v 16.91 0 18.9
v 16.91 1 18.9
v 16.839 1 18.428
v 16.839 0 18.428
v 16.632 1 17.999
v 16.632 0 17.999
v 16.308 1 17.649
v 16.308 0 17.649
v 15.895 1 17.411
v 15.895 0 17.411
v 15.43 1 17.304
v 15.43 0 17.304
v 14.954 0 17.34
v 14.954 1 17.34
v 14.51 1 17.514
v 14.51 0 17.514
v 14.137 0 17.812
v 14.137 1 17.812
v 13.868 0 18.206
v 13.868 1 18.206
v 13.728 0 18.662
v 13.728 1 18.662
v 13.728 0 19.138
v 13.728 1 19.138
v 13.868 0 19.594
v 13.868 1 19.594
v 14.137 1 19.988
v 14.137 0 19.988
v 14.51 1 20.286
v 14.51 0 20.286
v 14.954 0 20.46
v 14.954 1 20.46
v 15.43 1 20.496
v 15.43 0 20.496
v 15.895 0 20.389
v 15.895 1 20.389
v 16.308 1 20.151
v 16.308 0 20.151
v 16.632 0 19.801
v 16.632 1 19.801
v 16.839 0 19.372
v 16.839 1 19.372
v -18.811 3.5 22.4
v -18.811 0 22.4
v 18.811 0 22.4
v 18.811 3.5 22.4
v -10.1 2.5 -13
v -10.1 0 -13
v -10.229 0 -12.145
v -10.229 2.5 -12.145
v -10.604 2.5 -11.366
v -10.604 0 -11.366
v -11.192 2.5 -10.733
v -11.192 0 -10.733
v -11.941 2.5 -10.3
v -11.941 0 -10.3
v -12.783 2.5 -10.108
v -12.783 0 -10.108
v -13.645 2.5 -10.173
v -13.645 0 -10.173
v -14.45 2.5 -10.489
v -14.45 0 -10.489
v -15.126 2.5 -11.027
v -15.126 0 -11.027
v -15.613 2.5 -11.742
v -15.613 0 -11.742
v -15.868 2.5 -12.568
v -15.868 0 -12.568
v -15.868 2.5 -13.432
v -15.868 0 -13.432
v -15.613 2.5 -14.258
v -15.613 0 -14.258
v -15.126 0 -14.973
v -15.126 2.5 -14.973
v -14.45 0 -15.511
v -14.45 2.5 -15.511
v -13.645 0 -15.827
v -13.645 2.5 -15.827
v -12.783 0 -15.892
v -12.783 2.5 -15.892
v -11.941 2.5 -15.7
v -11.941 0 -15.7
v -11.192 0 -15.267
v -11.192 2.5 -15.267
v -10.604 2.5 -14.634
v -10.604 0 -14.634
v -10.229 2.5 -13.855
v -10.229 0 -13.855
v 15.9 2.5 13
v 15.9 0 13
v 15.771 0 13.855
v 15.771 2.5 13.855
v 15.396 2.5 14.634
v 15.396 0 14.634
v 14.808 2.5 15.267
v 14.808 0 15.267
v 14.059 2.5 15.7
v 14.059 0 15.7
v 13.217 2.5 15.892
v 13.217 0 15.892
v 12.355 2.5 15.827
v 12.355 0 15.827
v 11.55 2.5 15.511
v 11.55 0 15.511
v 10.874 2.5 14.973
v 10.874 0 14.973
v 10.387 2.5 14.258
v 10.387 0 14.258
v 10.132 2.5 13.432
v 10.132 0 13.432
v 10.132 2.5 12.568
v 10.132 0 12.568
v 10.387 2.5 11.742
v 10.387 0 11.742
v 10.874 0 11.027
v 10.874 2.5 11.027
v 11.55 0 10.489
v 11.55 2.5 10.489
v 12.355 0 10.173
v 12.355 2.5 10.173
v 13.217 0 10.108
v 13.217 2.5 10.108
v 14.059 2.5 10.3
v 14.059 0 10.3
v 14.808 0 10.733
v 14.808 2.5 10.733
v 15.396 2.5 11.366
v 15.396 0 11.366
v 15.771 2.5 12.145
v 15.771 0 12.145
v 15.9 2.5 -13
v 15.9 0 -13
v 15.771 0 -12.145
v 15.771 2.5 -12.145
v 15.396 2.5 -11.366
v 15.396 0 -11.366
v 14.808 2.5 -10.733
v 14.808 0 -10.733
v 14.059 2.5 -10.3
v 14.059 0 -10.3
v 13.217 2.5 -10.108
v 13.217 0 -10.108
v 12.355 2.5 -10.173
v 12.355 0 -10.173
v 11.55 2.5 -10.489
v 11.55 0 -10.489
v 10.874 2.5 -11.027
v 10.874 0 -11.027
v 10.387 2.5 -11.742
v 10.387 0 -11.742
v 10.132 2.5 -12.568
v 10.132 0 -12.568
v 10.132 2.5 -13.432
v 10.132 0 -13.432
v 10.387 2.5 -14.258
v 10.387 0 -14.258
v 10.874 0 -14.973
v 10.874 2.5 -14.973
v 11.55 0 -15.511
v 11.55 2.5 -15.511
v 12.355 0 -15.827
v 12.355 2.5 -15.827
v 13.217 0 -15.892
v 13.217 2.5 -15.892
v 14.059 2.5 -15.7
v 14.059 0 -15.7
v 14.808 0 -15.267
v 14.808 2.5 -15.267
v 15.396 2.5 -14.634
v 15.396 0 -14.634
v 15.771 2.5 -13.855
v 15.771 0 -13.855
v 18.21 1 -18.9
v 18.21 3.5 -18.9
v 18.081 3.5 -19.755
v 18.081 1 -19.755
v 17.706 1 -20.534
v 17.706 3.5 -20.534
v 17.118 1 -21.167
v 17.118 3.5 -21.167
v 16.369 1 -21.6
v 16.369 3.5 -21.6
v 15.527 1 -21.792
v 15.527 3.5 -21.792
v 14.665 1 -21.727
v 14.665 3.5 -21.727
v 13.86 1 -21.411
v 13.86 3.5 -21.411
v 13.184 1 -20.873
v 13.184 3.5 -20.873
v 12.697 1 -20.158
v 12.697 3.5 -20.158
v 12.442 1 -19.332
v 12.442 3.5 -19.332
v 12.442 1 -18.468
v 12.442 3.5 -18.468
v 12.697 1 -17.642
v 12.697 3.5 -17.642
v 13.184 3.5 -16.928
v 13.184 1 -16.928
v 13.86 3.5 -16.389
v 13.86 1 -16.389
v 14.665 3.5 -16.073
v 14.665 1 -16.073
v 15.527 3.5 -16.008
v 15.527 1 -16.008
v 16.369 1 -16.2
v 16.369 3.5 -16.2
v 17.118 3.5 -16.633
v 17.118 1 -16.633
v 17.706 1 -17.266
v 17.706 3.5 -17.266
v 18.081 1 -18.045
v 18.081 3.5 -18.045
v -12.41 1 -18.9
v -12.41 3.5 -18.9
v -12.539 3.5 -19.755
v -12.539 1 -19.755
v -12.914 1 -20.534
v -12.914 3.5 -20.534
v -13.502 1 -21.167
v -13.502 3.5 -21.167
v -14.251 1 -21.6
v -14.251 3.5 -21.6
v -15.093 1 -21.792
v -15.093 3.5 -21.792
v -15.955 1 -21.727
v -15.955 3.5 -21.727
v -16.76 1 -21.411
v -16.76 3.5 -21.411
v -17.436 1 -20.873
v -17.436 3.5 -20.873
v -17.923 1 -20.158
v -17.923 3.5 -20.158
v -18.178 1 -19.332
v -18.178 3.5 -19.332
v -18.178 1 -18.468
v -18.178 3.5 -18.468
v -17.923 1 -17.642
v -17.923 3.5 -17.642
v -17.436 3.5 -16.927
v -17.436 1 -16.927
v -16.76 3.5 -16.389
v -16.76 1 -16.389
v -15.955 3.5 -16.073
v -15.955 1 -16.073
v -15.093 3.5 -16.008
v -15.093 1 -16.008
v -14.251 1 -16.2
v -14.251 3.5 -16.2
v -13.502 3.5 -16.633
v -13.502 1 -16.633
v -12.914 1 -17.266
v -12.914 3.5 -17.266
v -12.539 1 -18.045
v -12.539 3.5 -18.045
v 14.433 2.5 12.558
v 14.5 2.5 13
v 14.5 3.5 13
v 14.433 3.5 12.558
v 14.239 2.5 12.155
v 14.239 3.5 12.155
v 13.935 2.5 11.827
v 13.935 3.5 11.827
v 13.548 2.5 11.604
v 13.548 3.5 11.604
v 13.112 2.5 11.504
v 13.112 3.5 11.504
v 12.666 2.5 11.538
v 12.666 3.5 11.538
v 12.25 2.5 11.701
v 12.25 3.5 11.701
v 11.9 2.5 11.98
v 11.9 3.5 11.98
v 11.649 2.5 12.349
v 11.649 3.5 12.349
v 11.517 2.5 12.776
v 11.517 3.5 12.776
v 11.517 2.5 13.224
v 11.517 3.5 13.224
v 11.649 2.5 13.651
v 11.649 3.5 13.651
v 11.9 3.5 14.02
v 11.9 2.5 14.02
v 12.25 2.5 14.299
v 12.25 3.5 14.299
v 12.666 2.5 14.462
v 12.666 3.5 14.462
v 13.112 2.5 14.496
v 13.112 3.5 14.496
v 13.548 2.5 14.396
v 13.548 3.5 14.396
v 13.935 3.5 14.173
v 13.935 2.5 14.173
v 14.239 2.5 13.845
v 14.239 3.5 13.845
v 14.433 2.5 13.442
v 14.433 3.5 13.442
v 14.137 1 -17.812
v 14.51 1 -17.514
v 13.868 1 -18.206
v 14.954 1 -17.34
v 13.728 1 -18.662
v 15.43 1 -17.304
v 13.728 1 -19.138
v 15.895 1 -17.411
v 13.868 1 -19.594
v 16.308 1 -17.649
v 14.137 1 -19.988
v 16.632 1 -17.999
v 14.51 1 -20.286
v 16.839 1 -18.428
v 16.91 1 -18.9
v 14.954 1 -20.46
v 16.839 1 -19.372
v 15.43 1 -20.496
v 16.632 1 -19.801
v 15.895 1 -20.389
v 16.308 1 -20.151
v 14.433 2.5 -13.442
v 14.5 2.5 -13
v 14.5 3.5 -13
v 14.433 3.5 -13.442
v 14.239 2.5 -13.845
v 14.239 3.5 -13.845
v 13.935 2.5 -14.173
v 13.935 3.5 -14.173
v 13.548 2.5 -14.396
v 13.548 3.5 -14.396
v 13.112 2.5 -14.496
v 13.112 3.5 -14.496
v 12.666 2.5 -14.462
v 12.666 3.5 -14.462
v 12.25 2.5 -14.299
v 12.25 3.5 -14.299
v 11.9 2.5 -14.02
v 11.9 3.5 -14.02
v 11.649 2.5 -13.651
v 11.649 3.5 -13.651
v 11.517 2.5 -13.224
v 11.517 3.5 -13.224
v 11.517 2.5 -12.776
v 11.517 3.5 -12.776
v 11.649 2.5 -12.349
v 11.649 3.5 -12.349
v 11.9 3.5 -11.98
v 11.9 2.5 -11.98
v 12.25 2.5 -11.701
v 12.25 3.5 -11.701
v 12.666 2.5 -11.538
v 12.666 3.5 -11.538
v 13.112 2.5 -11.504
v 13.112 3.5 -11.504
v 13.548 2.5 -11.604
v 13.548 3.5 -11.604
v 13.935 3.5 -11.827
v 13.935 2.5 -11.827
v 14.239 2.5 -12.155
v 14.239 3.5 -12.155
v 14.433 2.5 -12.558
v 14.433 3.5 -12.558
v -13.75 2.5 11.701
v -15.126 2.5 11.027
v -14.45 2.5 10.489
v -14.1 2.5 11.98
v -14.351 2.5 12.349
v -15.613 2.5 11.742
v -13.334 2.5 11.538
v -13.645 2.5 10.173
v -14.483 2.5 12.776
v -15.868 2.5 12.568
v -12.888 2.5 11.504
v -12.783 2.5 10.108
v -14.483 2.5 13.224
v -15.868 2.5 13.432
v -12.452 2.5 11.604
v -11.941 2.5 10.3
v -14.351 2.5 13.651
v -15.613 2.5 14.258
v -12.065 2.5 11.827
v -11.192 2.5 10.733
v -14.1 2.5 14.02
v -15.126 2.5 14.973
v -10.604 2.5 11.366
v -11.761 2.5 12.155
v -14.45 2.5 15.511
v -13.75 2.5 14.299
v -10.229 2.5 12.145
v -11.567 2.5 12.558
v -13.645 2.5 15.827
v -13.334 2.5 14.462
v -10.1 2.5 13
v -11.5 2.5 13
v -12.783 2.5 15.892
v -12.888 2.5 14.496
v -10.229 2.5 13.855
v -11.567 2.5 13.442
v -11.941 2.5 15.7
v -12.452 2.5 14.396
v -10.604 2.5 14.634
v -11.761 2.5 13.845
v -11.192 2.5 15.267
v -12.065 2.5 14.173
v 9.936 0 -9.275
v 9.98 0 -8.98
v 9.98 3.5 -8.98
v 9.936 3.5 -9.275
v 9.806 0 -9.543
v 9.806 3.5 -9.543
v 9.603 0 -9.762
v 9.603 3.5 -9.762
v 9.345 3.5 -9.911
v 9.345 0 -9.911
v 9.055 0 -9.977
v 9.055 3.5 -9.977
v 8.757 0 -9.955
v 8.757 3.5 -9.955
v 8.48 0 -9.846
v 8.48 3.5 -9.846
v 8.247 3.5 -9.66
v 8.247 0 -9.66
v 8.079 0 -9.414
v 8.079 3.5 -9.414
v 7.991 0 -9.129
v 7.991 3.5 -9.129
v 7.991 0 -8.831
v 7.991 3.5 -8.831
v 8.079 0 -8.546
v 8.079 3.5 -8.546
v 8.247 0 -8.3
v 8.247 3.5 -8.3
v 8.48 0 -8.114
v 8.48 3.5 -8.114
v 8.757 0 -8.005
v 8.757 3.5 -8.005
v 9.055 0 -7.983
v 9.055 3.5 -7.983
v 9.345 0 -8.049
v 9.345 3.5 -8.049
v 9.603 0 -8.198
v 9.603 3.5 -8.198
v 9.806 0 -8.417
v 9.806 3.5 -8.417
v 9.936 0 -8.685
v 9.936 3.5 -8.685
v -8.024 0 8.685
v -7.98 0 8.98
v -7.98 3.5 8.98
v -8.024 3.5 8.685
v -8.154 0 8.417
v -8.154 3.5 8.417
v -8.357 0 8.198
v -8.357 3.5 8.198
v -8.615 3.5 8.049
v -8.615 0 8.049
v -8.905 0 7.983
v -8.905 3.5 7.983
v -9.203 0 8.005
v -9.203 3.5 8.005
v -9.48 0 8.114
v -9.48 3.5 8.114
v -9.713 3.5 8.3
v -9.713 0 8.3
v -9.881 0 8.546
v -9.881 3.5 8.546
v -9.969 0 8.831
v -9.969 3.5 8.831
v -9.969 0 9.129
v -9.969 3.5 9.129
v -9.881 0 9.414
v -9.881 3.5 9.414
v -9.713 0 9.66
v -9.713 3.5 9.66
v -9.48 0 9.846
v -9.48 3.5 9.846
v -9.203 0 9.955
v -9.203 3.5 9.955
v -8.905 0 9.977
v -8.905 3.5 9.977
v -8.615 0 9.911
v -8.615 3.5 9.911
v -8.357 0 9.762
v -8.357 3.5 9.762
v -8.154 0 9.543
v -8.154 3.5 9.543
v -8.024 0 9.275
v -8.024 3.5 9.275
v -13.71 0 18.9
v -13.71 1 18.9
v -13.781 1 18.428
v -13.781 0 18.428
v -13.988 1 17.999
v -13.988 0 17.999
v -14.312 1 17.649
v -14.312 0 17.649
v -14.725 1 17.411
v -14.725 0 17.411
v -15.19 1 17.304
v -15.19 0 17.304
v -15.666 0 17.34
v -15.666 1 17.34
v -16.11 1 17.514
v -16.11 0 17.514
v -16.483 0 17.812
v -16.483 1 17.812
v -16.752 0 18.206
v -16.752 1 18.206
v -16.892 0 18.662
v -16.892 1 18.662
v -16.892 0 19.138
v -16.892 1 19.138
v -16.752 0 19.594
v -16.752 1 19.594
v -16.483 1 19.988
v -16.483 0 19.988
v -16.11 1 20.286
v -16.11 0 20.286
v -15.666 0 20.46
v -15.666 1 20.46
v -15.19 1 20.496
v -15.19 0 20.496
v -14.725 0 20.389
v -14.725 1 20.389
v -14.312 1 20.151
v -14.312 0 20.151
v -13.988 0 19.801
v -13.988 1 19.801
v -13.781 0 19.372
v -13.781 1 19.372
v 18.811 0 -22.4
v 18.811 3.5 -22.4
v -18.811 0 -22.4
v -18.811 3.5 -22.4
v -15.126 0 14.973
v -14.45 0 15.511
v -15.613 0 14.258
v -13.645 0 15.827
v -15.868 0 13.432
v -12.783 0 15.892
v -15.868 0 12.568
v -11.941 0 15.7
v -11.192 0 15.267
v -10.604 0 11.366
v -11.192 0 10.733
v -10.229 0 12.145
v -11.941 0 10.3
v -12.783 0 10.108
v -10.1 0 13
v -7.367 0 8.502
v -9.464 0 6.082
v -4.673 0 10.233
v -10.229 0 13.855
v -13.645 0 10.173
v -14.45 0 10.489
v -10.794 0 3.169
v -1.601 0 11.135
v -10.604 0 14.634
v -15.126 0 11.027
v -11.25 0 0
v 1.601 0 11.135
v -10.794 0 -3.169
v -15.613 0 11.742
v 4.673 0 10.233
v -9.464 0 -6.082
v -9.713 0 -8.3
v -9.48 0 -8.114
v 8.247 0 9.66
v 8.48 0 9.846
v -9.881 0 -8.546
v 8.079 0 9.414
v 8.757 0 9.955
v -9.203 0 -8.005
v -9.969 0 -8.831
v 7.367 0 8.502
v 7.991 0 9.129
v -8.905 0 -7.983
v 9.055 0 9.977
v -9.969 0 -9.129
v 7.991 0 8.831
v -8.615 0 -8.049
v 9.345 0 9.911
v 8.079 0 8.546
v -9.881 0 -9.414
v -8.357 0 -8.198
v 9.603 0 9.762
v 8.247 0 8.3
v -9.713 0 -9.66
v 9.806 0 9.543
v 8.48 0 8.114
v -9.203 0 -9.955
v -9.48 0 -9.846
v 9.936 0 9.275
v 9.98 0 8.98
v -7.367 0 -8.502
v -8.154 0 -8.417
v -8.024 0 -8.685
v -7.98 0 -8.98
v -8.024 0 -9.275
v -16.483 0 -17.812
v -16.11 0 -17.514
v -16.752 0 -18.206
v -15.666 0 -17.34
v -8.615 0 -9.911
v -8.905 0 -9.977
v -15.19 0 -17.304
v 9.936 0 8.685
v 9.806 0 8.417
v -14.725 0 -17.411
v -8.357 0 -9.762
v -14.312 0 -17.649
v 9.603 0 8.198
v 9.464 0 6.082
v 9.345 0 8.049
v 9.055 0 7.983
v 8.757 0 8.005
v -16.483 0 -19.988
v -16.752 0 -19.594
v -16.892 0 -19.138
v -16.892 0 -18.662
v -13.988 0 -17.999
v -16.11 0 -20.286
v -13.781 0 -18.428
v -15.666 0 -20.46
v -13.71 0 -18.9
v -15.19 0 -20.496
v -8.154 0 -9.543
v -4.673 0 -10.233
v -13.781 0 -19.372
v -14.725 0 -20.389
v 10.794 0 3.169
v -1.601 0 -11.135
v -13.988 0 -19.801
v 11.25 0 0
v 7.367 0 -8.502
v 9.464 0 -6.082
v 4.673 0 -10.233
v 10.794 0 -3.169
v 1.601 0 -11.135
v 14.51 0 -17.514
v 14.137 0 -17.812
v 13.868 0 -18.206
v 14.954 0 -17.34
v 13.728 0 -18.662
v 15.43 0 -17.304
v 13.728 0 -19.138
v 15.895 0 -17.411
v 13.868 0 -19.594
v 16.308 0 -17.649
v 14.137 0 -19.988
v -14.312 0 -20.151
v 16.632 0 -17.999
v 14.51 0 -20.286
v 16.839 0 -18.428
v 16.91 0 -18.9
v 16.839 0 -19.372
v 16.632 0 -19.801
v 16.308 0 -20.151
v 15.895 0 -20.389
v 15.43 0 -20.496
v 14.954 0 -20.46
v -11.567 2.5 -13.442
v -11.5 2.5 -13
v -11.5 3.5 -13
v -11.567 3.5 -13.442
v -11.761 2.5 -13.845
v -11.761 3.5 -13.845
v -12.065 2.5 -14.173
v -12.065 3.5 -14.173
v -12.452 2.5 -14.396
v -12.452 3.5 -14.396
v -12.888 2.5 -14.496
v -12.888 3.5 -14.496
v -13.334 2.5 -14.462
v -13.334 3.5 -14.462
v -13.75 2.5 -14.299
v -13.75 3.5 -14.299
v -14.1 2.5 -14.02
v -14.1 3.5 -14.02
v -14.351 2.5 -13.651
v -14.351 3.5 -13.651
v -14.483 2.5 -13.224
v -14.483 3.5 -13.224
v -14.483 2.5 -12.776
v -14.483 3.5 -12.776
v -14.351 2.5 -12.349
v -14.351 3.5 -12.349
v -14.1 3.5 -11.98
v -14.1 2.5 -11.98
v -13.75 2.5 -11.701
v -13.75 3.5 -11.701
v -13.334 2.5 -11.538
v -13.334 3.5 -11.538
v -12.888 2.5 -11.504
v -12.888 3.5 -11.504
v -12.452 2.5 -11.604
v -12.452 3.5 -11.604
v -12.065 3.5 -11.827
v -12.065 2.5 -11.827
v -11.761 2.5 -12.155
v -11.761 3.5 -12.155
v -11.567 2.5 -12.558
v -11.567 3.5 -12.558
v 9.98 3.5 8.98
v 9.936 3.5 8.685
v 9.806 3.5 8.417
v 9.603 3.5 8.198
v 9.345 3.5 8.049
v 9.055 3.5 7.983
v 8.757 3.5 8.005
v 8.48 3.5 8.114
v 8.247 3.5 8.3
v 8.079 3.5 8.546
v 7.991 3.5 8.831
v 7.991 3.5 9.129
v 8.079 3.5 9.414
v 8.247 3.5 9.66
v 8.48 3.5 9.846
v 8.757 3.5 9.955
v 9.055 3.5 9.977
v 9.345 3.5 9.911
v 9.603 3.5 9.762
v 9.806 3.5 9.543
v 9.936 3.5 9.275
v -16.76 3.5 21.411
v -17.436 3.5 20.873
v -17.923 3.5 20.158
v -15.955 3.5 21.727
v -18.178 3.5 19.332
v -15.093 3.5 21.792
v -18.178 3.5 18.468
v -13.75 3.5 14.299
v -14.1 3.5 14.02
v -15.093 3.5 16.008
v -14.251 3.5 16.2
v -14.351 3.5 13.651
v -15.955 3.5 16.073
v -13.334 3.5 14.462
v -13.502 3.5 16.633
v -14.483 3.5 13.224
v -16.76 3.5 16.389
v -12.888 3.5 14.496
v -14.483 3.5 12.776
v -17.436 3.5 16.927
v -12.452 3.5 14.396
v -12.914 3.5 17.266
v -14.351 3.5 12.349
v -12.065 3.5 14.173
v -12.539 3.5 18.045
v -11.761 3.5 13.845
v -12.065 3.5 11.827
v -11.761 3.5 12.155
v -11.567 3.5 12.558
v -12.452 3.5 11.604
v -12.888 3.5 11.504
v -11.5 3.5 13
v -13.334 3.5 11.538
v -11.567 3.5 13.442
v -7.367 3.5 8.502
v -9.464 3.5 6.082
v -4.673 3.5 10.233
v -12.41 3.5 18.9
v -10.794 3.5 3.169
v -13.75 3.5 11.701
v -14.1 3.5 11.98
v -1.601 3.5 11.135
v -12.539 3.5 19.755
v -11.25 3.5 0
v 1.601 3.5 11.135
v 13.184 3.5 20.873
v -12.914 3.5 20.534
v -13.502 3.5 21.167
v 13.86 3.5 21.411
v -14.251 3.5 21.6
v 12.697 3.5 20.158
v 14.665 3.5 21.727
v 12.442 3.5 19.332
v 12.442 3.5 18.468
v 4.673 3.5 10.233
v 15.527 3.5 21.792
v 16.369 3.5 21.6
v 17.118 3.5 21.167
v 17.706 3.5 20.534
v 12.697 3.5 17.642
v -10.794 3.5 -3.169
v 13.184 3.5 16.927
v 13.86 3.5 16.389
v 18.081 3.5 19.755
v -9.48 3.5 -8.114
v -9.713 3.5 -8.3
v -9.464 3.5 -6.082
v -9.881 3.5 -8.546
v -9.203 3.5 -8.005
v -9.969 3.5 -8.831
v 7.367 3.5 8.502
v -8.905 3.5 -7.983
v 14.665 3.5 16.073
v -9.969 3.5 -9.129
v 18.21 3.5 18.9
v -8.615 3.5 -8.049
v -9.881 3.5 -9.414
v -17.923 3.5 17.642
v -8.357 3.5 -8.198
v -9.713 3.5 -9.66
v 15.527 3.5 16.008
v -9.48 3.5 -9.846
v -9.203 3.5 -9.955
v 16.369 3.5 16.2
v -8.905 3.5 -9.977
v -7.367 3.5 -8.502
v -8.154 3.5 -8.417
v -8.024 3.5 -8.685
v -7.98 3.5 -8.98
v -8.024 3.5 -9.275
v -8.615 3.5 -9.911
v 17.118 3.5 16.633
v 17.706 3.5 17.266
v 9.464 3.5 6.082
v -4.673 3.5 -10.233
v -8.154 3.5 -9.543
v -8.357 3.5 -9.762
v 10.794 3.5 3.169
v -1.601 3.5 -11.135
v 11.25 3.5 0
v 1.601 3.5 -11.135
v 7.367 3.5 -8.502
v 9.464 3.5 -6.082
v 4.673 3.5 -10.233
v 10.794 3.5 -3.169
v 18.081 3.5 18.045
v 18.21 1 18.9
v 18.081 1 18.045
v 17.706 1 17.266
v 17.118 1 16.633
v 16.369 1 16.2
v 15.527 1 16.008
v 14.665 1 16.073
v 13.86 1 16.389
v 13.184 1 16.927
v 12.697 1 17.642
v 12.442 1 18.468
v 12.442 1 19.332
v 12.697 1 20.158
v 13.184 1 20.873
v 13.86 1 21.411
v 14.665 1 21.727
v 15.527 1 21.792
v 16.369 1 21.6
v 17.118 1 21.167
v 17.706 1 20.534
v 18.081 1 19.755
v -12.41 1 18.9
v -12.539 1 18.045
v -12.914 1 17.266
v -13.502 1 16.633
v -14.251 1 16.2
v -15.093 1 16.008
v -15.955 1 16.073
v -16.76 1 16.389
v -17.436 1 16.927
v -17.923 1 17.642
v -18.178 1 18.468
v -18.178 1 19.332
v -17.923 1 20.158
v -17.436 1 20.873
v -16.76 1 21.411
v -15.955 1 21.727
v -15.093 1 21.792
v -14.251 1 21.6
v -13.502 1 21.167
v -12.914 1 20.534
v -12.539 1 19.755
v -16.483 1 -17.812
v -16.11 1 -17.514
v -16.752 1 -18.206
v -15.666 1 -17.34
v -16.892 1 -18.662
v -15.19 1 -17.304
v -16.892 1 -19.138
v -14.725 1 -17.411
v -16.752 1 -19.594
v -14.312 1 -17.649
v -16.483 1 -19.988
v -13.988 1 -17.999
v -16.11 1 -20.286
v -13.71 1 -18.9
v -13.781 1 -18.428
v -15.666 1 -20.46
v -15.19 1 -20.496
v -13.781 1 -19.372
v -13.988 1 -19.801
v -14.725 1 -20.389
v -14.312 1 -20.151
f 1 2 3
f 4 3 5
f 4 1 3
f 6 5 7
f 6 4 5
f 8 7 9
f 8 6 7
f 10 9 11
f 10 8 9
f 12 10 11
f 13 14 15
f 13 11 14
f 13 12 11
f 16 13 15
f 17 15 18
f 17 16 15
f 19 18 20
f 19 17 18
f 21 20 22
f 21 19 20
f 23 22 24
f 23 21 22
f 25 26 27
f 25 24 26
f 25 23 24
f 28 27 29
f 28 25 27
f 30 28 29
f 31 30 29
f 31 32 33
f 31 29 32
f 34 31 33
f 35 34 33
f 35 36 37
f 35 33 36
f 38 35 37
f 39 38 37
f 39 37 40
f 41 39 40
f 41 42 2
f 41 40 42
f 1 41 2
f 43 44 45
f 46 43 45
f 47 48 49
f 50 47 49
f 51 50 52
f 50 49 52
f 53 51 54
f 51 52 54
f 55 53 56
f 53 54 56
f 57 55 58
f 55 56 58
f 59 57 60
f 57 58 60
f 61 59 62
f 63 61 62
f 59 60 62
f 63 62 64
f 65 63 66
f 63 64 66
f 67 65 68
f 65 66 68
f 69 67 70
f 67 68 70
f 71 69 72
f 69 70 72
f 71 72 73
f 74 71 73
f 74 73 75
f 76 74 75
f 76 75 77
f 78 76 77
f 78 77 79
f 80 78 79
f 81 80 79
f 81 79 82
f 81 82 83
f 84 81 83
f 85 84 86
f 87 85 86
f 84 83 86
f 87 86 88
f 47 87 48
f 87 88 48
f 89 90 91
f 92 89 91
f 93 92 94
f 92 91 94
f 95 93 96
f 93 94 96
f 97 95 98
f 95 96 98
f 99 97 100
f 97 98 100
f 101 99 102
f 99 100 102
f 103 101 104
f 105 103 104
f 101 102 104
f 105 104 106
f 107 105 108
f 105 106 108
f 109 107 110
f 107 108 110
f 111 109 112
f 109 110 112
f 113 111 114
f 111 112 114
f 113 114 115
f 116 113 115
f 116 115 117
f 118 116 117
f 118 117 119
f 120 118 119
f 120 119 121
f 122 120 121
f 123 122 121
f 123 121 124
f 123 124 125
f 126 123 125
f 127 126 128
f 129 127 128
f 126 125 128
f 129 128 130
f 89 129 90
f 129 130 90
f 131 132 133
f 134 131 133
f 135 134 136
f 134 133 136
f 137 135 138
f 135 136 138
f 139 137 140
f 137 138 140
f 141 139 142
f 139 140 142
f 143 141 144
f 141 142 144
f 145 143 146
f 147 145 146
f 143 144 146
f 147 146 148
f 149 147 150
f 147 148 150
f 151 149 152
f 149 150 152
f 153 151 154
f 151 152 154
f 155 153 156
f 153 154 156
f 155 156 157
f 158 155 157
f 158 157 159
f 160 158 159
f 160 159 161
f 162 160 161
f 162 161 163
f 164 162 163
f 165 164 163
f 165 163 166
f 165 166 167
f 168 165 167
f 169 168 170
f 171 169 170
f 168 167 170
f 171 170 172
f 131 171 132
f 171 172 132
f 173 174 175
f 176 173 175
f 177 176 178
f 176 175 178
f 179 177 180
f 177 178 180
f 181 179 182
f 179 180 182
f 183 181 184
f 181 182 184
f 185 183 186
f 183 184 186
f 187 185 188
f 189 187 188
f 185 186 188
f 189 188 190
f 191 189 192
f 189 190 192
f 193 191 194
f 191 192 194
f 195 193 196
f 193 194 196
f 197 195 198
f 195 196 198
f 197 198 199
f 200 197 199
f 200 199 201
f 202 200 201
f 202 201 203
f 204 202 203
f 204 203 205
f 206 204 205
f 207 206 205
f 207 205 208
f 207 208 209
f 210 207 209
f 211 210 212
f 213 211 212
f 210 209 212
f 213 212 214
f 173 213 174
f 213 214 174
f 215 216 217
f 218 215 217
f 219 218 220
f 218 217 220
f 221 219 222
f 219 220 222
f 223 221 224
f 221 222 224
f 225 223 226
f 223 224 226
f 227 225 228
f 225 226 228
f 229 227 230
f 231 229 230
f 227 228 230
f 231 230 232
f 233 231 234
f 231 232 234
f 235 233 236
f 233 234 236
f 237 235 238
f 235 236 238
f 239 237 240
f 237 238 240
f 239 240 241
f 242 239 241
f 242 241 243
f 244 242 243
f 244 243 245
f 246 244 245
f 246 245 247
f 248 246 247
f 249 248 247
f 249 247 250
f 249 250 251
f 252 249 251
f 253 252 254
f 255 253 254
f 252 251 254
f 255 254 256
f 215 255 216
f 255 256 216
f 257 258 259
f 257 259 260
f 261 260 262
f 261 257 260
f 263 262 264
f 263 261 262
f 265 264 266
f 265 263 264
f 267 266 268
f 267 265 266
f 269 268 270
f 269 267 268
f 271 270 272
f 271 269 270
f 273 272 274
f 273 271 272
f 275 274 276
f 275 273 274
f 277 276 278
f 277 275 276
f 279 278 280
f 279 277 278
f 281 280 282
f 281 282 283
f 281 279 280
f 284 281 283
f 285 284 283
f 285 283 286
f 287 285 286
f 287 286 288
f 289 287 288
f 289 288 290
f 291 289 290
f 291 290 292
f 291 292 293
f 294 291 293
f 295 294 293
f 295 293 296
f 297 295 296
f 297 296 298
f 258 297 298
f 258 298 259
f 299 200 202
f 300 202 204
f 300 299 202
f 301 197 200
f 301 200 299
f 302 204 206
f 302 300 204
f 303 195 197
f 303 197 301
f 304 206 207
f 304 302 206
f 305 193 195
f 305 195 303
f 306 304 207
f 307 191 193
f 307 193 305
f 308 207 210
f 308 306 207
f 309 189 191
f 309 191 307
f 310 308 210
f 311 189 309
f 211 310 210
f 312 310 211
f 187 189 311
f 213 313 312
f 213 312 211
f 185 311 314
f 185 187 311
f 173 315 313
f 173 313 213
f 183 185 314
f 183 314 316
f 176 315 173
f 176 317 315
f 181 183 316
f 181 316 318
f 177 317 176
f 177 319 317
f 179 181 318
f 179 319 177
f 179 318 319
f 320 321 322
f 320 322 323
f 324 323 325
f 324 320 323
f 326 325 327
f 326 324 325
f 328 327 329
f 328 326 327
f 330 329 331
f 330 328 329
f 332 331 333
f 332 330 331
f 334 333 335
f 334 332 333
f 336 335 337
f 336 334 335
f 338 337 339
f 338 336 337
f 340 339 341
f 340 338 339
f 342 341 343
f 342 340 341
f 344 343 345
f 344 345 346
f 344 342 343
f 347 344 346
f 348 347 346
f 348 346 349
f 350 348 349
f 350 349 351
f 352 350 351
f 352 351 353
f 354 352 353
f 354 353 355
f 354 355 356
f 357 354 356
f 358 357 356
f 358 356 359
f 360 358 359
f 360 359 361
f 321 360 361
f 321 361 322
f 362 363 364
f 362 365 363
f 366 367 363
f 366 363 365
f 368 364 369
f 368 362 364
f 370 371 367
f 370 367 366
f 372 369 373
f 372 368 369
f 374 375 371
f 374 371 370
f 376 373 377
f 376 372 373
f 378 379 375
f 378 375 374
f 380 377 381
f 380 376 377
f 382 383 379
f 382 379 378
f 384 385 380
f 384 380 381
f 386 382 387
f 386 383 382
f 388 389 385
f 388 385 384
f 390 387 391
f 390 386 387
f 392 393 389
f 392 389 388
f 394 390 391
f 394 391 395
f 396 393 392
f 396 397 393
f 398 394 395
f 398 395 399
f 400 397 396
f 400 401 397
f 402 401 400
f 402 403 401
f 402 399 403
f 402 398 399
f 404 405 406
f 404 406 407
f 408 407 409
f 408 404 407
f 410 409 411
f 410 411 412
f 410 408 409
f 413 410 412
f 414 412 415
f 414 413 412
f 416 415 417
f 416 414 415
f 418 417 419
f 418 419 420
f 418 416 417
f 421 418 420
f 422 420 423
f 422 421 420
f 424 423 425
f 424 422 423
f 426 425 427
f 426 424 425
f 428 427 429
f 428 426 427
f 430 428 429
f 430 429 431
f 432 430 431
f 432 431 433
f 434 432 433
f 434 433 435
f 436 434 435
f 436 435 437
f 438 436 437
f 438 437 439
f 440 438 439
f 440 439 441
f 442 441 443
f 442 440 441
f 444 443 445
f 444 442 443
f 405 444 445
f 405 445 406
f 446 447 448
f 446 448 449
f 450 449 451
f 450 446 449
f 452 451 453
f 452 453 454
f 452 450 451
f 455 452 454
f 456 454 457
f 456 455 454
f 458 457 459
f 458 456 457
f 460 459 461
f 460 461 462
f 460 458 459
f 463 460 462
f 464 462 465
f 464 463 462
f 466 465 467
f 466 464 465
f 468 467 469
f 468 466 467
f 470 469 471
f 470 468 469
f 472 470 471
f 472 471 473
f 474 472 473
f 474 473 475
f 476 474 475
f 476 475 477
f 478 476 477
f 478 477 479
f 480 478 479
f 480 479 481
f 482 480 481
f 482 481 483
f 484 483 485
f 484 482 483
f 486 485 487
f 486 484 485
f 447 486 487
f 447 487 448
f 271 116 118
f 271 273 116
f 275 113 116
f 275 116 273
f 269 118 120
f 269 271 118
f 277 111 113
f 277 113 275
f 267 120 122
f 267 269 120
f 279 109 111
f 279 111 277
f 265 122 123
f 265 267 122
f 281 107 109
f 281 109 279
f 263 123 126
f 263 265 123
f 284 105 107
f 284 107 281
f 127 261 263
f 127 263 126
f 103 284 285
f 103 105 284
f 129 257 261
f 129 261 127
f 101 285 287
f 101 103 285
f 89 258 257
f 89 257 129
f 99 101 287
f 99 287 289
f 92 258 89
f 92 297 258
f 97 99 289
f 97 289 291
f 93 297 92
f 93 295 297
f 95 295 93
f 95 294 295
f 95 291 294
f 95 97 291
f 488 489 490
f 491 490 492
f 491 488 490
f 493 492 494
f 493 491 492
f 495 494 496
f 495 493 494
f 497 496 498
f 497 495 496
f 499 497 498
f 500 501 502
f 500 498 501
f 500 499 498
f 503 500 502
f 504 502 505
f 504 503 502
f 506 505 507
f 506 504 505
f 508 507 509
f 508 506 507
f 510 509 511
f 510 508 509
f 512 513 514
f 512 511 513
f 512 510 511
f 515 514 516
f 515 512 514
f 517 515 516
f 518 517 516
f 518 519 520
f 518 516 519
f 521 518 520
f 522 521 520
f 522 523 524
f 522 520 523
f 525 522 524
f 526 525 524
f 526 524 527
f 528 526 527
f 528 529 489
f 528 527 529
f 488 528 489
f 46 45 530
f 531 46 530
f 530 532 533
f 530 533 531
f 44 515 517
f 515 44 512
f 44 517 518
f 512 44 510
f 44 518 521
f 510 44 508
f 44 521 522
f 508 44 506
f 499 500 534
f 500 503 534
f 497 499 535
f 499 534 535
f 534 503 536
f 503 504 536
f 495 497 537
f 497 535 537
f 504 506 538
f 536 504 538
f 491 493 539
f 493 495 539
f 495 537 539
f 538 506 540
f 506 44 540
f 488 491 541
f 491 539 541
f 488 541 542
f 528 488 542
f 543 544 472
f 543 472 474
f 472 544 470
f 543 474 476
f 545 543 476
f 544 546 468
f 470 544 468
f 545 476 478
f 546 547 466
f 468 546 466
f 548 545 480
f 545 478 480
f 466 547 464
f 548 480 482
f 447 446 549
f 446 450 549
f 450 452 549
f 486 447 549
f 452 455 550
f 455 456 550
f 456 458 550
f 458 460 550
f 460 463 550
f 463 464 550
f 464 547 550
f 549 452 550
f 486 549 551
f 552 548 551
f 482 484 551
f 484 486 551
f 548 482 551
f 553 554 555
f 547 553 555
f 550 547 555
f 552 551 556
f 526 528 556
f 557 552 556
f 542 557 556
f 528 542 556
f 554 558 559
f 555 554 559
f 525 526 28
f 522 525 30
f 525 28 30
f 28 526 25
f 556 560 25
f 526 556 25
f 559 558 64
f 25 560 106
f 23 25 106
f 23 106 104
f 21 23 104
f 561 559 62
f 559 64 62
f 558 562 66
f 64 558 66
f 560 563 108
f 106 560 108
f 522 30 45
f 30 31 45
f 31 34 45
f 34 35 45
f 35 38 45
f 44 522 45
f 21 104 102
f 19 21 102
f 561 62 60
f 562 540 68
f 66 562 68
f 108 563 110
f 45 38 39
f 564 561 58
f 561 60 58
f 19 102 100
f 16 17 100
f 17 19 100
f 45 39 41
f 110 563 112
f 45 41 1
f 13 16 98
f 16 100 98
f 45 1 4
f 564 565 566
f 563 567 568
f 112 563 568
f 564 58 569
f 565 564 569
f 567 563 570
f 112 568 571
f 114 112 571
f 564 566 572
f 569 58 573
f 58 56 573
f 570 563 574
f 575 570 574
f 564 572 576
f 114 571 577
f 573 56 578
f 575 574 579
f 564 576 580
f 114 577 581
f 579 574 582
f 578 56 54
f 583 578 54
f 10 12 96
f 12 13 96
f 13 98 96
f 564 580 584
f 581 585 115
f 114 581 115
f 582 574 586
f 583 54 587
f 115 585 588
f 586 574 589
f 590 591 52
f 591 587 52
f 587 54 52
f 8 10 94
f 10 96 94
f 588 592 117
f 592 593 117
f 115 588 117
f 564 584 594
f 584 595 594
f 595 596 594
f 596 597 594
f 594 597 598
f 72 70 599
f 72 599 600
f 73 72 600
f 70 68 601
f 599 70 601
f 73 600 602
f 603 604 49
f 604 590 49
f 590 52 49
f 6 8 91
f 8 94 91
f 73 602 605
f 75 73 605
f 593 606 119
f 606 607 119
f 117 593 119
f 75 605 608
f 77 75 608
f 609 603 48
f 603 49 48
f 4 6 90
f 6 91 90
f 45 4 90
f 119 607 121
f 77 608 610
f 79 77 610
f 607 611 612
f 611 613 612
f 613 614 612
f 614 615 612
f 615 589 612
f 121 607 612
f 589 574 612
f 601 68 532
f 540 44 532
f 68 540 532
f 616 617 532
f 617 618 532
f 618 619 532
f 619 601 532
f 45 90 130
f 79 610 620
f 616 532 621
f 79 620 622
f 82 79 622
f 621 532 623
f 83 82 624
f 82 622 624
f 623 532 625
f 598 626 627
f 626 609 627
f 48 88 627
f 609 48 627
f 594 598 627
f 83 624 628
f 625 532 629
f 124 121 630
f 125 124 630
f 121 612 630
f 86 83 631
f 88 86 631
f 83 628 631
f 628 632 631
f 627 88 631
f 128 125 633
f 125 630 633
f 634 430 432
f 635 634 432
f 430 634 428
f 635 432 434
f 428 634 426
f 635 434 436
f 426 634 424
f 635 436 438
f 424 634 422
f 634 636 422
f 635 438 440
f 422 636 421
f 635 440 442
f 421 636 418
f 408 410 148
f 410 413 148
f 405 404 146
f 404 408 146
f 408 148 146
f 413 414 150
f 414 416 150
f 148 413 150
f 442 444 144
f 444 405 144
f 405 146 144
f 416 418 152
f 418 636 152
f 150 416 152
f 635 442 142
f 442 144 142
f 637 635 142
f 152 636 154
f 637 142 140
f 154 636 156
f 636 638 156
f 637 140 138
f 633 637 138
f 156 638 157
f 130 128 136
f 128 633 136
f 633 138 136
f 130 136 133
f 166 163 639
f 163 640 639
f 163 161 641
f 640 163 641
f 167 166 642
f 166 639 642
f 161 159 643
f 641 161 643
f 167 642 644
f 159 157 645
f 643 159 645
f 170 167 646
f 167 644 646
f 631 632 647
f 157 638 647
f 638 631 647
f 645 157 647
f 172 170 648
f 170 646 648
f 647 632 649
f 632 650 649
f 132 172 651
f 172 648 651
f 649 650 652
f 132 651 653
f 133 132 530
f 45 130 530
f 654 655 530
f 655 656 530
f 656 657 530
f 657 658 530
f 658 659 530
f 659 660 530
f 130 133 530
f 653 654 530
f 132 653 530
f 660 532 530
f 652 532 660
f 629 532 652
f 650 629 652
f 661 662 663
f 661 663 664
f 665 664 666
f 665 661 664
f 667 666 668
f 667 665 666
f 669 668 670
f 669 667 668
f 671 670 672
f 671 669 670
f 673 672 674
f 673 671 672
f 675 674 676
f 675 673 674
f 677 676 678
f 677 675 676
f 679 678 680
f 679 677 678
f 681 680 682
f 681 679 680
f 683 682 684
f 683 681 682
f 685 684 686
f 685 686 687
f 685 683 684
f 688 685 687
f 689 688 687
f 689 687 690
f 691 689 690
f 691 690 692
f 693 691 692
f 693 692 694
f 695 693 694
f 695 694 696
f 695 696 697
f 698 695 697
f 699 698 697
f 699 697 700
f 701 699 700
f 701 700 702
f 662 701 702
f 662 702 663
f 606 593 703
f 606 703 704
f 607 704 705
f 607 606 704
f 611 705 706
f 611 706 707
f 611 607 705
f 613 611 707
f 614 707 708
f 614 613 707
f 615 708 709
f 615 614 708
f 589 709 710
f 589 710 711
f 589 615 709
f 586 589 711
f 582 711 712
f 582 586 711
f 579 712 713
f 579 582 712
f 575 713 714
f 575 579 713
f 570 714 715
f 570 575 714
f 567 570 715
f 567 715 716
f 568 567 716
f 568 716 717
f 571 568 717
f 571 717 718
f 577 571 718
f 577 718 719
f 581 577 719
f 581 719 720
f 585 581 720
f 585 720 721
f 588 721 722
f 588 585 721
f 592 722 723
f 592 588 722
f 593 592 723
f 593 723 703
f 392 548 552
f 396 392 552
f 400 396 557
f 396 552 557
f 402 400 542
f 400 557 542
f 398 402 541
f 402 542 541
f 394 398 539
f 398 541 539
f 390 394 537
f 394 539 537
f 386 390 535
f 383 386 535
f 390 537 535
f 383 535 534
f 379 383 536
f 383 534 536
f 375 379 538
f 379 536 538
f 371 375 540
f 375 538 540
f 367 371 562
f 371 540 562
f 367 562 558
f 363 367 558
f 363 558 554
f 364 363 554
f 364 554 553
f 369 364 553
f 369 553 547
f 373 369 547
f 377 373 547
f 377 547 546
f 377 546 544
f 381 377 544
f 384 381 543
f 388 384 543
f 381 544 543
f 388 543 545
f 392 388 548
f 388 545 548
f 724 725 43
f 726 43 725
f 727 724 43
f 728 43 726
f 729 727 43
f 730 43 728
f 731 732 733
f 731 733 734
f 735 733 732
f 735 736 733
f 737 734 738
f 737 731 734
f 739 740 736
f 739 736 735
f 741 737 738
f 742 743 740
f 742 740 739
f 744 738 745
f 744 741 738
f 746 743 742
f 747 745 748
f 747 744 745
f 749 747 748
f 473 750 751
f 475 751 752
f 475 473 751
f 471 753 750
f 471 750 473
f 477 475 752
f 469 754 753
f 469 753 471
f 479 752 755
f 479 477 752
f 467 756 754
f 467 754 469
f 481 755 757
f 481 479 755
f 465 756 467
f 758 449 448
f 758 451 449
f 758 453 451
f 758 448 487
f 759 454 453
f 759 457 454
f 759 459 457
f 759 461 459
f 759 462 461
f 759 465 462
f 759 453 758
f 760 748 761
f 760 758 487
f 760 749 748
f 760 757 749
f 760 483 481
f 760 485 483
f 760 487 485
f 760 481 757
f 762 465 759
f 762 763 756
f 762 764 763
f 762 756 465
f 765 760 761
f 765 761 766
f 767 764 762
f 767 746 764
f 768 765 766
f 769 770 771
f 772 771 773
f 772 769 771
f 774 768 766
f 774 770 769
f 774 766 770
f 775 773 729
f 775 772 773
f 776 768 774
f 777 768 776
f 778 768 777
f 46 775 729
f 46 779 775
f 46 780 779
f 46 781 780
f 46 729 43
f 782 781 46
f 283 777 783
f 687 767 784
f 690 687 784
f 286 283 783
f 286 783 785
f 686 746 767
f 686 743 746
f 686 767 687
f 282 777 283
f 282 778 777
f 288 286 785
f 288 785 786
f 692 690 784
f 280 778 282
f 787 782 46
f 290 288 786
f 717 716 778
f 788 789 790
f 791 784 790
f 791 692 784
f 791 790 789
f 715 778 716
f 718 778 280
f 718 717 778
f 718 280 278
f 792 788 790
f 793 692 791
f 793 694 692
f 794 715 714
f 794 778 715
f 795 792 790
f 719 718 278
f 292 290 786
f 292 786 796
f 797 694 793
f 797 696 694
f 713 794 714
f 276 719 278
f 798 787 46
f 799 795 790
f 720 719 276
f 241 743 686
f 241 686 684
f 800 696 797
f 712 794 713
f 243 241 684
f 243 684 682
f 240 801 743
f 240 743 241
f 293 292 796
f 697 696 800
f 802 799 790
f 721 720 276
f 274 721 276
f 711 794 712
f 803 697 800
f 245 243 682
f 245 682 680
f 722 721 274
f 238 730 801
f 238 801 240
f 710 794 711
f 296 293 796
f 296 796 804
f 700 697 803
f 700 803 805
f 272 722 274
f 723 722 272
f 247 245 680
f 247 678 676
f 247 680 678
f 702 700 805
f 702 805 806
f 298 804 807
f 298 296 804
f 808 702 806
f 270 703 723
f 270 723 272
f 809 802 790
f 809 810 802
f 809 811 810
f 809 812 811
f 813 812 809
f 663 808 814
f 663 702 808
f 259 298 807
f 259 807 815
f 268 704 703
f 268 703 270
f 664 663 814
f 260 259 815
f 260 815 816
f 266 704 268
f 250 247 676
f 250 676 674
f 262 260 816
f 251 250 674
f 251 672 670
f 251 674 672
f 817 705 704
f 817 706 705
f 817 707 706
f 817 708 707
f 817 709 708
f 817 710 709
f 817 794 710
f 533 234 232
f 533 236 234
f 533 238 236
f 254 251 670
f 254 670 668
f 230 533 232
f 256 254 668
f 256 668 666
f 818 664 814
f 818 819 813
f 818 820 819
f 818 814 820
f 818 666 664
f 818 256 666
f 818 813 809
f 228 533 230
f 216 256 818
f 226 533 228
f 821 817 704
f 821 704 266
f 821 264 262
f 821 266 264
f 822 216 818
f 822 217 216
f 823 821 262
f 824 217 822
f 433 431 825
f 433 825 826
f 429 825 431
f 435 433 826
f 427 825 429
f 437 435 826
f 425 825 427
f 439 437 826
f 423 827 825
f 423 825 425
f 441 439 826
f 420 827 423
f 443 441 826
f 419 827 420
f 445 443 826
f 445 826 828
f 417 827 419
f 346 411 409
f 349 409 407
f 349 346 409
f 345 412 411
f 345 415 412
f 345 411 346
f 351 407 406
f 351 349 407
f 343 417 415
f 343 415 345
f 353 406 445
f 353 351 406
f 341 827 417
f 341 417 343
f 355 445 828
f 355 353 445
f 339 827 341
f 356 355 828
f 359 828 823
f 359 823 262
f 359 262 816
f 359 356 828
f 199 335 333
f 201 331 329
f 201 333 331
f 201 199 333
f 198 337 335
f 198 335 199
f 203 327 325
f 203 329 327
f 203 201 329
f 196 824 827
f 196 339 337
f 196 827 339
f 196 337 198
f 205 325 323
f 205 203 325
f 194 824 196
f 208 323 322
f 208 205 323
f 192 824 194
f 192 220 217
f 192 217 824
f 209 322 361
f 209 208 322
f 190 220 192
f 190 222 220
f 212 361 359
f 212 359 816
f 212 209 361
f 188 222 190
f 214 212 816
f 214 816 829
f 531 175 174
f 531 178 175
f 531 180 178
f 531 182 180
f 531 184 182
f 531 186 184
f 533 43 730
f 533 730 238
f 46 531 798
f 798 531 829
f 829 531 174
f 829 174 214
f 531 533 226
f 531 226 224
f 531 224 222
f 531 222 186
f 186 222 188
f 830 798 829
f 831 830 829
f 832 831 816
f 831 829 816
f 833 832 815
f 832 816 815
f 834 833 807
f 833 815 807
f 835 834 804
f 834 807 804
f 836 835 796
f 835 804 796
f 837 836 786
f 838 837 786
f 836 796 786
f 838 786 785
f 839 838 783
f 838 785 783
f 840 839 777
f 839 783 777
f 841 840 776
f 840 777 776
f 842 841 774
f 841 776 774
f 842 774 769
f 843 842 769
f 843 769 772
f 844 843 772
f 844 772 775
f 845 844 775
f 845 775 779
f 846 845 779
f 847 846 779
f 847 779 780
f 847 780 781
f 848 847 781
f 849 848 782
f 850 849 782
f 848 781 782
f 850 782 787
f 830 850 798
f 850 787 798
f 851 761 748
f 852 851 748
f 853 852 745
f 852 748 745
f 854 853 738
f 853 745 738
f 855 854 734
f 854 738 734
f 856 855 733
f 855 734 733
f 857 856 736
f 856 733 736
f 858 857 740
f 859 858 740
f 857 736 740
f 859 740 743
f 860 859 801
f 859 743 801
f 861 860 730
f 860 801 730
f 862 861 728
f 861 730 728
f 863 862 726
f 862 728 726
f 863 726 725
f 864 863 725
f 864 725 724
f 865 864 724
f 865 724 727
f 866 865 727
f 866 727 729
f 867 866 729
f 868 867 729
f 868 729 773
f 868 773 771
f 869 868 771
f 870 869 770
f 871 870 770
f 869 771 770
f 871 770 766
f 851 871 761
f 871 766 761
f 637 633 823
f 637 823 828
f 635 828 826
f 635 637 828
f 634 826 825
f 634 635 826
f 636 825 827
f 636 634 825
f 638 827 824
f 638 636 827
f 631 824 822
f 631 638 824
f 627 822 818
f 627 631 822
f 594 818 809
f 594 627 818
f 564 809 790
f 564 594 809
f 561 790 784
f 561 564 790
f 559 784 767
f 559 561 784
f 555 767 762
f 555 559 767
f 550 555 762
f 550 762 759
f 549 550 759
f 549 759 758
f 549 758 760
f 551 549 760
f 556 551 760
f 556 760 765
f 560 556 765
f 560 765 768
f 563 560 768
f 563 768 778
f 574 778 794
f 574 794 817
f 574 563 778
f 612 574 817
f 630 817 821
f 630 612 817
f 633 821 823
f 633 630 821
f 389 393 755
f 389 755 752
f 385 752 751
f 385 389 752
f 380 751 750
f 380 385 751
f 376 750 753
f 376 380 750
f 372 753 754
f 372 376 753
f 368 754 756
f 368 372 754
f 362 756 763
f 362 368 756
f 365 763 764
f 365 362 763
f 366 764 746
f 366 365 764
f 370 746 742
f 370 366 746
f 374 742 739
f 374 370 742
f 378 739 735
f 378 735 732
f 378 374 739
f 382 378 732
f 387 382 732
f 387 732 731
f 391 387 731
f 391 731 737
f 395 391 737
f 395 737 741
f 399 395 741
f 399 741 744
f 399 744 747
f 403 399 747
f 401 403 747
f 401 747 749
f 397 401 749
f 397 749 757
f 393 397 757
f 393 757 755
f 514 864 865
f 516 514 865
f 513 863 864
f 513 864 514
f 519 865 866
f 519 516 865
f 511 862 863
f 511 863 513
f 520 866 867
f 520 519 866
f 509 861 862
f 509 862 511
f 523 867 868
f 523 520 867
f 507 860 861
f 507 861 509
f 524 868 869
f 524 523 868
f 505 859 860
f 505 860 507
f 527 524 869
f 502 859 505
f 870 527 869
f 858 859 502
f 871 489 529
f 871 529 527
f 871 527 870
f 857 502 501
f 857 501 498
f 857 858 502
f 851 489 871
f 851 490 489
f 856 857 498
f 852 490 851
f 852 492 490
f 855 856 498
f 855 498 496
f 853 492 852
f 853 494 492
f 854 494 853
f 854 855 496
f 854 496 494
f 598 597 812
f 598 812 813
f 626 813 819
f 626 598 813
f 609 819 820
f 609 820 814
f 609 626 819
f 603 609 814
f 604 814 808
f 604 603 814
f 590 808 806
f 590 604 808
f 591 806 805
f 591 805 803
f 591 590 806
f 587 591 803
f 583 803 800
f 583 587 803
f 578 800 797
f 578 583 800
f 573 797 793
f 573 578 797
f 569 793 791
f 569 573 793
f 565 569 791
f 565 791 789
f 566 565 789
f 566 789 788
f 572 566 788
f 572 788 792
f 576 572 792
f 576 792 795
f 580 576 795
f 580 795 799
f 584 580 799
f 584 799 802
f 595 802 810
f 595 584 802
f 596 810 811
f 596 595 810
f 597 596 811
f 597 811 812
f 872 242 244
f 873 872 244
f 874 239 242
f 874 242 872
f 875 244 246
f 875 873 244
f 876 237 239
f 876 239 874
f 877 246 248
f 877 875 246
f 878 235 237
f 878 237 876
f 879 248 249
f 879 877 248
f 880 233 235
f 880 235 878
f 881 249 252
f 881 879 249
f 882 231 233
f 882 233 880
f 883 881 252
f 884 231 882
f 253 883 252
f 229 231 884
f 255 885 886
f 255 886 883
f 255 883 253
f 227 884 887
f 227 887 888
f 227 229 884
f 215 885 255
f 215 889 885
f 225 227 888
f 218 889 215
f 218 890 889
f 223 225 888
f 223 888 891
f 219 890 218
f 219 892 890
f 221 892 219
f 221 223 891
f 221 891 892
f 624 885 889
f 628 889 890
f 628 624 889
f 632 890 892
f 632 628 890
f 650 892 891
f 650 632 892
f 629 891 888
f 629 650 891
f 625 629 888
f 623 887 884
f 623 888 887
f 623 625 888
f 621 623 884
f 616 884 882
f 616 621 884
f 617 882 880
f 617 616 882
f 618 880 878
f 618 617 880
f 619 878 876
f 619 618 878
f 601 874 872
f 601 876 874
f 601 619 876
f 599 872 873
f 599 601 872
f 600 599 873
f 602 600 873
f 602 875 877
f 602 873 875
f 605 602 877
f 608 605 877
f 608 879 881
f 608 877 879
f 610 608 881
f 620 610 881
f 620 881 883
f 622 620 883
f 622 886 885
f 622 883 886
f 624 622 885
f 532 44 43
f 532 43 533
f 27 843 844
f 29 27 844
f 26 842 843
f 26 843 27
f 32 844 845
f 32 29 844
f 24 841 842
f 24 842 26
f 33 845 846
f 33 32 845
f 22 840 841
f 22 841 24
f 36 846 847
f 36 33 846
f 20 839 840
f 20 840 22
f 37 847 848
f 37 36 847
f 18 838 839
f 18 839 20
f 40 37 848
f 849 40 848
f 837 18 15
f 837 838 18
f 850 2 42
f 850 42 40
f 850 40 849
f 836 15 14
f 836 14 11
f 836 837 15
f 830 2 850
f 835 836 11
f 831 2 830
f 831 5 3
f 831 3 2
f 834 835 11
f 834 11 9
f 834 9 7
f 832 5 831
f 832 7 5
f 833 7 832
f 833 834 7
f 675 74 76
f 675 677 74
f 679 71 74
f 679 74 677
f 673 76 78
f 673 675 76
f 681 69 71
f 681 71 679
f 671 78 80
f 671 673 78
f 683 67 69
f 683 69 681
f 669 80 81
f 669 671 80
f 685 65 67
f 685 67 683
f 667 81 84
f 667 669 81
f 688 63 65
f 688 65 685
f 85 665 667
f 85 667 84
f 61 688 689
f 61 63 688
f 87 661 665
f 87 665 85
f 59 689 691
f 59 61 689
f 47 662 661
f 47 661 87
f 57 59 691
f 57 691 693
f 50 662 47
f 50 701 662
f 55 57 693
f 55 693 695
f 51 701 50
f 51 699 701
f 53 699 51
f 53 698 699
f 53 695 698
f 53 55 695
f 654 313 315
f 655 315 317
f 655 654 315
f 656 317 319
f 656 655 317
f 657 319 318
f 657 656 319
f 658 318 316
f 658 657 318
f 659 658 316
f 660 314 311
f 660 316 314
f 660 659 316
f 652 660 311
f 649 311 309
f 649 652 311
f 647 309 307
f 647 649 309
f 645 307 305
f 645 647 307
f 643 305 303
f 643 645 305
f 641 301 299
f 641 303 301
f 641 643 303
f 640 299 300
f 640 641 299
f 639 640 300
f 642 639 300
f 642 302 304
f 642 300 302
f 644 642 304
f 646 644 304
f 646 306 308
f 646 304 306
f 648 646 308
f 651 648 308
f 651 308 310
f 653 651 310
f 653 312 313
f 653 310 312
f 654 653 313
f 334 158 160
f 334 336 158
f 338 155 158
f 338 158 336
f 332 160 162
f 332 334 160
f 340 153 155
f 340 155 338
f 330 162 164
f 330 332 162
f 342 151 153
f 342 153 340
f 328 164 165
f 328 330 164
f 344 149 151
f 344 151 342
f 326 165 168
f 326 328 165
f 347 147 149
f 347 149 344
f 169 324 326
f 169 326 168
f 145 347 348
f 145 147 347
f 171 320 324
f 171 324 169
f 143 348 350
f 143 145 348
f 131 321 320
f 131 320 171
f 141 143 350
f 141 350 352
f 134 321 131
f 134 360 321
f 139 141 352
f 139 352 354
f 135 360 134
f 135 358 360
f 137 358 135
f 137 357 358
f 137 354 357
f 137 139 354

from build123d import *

# Parameters (mm, degrees)
SKETCH2_W           = 37.621859492
SKETCH2_H           = 44.8
SKETCH2_R           = 11.25
SKETCH2_R_2         = 1.5
SKETCH2_R_3         = 1
SKETCH2_R_4         = 1.6
BOSS_EXTRUDE1_DEPTH = 3.5
SKETCH4_R           = 2.9
CUT_EXTRUDE1_DEPTH  = 2.5
SKETCH6_R           = 2.9
CUT_EXTRUDE2_DEPTH  = 2.5


with BuildPart() as part:
    # Sketch2 → Boss-Extrude1 (new body)
    with BuildSketch(Plane(origin=(0, 0, 0), x_dir=(1, 0, 0), z_dir=(0, 1, 0))):
        Rectangle(SKETCH2_W, SKETCH2_H)
        Circle(SKETCH2_R, mode=Mode.SUBTRACT)
        with Locations((-13, 13)):
            Circle(SKETCH2_R_2, mode=Mode.SUBTRACT)
        with Locations((13, 13)):
            Circle(SKETCH2_R_2, mode=Mode.SUBTRACT)
        with Locations((13, -13)):
            Circle(SKETCH2_R_2, mode=Mode.SUBTRACT)
        with Locations((-13, -13)):
            Circle(SKETCH2_R_2, mode=Mode.SUBTRACT)
        with Locations((8.98, 8.98)):
            Circle(SKETCH2_R_3, mode=Mode.SUBTRACT)
        with Locations((-8.98, 8.98)):
            Circle(SKETCH2_R_3, mode=Mode.SUBTRACT)
        with Locations((8.98, -8.98)):
            Circle(SKETCH2_R_3, mode=Mode.SUBTRACT)
        with Locations((-8.98, -8.98)):
            Circle(SKETCH2_R_3, mode=Mode.SUBTRACT)
        with Locations((-15.31, 18.9)):
            Circle(SKETCH2_R_4, mode=Mode.SUBTRACT)
        with Locations((15.31, 18.9)):
            Circle(SKETCH2_R_4, mode=Mode.SUBTRACT)
        with Locations((15.31, -18.9)):
            Circle(SKETCH2_R_4, mode=Mode.SUBTRACT)
        with Locations((-15.31, -18.9)):
            Circle(SKETCH2_R_4, mode=Mode.SUBTRACT)
    extrude(amount=BOSS_EXTRUDE1_DEPTH)

    # Sketch4 → Cut-Extrude1 (cut)
    with BuildSketch(Plane.XZ):
        with Locations((-13, -13)):
            Circle(SKETCH4_R)
        with Locations((13, -13)):
            Circle(SKETCH4_R)
        with Locations((13, 13)):
            Circle(SKETCH4_R)
        with Locations((-13, 13)):
            Circle(SKETCH4_R)
    extrude(amount=-CUT_EXTRUDE1_DEPTH, mode=Mode.SUBTRACT)

    # Sketch6 → Cut-Extrude2 (cut)
    with BuildSketch(Plane(origin=(0, 3.5, 0), x_dir=(1, 0, 0), z_dir=(0, 1, 0))):
        with Locations((-15.31, 18.9)):
            Circle(SKETCH6_R)
        with Locations((15.31, -18.9)):
            Circle(SKETCH6_R)
        with Locations((15.309998981, 18.900002337)):
            Circle(SKETCH6_R)
        with Locations((-15.31, -18.9)):
            Circle(SKETCH6_R)
    extrude(amount=-CUT_EXTRUDE2_DEPTH, mode=Mode.SUBTRACT)


solid = part.part
